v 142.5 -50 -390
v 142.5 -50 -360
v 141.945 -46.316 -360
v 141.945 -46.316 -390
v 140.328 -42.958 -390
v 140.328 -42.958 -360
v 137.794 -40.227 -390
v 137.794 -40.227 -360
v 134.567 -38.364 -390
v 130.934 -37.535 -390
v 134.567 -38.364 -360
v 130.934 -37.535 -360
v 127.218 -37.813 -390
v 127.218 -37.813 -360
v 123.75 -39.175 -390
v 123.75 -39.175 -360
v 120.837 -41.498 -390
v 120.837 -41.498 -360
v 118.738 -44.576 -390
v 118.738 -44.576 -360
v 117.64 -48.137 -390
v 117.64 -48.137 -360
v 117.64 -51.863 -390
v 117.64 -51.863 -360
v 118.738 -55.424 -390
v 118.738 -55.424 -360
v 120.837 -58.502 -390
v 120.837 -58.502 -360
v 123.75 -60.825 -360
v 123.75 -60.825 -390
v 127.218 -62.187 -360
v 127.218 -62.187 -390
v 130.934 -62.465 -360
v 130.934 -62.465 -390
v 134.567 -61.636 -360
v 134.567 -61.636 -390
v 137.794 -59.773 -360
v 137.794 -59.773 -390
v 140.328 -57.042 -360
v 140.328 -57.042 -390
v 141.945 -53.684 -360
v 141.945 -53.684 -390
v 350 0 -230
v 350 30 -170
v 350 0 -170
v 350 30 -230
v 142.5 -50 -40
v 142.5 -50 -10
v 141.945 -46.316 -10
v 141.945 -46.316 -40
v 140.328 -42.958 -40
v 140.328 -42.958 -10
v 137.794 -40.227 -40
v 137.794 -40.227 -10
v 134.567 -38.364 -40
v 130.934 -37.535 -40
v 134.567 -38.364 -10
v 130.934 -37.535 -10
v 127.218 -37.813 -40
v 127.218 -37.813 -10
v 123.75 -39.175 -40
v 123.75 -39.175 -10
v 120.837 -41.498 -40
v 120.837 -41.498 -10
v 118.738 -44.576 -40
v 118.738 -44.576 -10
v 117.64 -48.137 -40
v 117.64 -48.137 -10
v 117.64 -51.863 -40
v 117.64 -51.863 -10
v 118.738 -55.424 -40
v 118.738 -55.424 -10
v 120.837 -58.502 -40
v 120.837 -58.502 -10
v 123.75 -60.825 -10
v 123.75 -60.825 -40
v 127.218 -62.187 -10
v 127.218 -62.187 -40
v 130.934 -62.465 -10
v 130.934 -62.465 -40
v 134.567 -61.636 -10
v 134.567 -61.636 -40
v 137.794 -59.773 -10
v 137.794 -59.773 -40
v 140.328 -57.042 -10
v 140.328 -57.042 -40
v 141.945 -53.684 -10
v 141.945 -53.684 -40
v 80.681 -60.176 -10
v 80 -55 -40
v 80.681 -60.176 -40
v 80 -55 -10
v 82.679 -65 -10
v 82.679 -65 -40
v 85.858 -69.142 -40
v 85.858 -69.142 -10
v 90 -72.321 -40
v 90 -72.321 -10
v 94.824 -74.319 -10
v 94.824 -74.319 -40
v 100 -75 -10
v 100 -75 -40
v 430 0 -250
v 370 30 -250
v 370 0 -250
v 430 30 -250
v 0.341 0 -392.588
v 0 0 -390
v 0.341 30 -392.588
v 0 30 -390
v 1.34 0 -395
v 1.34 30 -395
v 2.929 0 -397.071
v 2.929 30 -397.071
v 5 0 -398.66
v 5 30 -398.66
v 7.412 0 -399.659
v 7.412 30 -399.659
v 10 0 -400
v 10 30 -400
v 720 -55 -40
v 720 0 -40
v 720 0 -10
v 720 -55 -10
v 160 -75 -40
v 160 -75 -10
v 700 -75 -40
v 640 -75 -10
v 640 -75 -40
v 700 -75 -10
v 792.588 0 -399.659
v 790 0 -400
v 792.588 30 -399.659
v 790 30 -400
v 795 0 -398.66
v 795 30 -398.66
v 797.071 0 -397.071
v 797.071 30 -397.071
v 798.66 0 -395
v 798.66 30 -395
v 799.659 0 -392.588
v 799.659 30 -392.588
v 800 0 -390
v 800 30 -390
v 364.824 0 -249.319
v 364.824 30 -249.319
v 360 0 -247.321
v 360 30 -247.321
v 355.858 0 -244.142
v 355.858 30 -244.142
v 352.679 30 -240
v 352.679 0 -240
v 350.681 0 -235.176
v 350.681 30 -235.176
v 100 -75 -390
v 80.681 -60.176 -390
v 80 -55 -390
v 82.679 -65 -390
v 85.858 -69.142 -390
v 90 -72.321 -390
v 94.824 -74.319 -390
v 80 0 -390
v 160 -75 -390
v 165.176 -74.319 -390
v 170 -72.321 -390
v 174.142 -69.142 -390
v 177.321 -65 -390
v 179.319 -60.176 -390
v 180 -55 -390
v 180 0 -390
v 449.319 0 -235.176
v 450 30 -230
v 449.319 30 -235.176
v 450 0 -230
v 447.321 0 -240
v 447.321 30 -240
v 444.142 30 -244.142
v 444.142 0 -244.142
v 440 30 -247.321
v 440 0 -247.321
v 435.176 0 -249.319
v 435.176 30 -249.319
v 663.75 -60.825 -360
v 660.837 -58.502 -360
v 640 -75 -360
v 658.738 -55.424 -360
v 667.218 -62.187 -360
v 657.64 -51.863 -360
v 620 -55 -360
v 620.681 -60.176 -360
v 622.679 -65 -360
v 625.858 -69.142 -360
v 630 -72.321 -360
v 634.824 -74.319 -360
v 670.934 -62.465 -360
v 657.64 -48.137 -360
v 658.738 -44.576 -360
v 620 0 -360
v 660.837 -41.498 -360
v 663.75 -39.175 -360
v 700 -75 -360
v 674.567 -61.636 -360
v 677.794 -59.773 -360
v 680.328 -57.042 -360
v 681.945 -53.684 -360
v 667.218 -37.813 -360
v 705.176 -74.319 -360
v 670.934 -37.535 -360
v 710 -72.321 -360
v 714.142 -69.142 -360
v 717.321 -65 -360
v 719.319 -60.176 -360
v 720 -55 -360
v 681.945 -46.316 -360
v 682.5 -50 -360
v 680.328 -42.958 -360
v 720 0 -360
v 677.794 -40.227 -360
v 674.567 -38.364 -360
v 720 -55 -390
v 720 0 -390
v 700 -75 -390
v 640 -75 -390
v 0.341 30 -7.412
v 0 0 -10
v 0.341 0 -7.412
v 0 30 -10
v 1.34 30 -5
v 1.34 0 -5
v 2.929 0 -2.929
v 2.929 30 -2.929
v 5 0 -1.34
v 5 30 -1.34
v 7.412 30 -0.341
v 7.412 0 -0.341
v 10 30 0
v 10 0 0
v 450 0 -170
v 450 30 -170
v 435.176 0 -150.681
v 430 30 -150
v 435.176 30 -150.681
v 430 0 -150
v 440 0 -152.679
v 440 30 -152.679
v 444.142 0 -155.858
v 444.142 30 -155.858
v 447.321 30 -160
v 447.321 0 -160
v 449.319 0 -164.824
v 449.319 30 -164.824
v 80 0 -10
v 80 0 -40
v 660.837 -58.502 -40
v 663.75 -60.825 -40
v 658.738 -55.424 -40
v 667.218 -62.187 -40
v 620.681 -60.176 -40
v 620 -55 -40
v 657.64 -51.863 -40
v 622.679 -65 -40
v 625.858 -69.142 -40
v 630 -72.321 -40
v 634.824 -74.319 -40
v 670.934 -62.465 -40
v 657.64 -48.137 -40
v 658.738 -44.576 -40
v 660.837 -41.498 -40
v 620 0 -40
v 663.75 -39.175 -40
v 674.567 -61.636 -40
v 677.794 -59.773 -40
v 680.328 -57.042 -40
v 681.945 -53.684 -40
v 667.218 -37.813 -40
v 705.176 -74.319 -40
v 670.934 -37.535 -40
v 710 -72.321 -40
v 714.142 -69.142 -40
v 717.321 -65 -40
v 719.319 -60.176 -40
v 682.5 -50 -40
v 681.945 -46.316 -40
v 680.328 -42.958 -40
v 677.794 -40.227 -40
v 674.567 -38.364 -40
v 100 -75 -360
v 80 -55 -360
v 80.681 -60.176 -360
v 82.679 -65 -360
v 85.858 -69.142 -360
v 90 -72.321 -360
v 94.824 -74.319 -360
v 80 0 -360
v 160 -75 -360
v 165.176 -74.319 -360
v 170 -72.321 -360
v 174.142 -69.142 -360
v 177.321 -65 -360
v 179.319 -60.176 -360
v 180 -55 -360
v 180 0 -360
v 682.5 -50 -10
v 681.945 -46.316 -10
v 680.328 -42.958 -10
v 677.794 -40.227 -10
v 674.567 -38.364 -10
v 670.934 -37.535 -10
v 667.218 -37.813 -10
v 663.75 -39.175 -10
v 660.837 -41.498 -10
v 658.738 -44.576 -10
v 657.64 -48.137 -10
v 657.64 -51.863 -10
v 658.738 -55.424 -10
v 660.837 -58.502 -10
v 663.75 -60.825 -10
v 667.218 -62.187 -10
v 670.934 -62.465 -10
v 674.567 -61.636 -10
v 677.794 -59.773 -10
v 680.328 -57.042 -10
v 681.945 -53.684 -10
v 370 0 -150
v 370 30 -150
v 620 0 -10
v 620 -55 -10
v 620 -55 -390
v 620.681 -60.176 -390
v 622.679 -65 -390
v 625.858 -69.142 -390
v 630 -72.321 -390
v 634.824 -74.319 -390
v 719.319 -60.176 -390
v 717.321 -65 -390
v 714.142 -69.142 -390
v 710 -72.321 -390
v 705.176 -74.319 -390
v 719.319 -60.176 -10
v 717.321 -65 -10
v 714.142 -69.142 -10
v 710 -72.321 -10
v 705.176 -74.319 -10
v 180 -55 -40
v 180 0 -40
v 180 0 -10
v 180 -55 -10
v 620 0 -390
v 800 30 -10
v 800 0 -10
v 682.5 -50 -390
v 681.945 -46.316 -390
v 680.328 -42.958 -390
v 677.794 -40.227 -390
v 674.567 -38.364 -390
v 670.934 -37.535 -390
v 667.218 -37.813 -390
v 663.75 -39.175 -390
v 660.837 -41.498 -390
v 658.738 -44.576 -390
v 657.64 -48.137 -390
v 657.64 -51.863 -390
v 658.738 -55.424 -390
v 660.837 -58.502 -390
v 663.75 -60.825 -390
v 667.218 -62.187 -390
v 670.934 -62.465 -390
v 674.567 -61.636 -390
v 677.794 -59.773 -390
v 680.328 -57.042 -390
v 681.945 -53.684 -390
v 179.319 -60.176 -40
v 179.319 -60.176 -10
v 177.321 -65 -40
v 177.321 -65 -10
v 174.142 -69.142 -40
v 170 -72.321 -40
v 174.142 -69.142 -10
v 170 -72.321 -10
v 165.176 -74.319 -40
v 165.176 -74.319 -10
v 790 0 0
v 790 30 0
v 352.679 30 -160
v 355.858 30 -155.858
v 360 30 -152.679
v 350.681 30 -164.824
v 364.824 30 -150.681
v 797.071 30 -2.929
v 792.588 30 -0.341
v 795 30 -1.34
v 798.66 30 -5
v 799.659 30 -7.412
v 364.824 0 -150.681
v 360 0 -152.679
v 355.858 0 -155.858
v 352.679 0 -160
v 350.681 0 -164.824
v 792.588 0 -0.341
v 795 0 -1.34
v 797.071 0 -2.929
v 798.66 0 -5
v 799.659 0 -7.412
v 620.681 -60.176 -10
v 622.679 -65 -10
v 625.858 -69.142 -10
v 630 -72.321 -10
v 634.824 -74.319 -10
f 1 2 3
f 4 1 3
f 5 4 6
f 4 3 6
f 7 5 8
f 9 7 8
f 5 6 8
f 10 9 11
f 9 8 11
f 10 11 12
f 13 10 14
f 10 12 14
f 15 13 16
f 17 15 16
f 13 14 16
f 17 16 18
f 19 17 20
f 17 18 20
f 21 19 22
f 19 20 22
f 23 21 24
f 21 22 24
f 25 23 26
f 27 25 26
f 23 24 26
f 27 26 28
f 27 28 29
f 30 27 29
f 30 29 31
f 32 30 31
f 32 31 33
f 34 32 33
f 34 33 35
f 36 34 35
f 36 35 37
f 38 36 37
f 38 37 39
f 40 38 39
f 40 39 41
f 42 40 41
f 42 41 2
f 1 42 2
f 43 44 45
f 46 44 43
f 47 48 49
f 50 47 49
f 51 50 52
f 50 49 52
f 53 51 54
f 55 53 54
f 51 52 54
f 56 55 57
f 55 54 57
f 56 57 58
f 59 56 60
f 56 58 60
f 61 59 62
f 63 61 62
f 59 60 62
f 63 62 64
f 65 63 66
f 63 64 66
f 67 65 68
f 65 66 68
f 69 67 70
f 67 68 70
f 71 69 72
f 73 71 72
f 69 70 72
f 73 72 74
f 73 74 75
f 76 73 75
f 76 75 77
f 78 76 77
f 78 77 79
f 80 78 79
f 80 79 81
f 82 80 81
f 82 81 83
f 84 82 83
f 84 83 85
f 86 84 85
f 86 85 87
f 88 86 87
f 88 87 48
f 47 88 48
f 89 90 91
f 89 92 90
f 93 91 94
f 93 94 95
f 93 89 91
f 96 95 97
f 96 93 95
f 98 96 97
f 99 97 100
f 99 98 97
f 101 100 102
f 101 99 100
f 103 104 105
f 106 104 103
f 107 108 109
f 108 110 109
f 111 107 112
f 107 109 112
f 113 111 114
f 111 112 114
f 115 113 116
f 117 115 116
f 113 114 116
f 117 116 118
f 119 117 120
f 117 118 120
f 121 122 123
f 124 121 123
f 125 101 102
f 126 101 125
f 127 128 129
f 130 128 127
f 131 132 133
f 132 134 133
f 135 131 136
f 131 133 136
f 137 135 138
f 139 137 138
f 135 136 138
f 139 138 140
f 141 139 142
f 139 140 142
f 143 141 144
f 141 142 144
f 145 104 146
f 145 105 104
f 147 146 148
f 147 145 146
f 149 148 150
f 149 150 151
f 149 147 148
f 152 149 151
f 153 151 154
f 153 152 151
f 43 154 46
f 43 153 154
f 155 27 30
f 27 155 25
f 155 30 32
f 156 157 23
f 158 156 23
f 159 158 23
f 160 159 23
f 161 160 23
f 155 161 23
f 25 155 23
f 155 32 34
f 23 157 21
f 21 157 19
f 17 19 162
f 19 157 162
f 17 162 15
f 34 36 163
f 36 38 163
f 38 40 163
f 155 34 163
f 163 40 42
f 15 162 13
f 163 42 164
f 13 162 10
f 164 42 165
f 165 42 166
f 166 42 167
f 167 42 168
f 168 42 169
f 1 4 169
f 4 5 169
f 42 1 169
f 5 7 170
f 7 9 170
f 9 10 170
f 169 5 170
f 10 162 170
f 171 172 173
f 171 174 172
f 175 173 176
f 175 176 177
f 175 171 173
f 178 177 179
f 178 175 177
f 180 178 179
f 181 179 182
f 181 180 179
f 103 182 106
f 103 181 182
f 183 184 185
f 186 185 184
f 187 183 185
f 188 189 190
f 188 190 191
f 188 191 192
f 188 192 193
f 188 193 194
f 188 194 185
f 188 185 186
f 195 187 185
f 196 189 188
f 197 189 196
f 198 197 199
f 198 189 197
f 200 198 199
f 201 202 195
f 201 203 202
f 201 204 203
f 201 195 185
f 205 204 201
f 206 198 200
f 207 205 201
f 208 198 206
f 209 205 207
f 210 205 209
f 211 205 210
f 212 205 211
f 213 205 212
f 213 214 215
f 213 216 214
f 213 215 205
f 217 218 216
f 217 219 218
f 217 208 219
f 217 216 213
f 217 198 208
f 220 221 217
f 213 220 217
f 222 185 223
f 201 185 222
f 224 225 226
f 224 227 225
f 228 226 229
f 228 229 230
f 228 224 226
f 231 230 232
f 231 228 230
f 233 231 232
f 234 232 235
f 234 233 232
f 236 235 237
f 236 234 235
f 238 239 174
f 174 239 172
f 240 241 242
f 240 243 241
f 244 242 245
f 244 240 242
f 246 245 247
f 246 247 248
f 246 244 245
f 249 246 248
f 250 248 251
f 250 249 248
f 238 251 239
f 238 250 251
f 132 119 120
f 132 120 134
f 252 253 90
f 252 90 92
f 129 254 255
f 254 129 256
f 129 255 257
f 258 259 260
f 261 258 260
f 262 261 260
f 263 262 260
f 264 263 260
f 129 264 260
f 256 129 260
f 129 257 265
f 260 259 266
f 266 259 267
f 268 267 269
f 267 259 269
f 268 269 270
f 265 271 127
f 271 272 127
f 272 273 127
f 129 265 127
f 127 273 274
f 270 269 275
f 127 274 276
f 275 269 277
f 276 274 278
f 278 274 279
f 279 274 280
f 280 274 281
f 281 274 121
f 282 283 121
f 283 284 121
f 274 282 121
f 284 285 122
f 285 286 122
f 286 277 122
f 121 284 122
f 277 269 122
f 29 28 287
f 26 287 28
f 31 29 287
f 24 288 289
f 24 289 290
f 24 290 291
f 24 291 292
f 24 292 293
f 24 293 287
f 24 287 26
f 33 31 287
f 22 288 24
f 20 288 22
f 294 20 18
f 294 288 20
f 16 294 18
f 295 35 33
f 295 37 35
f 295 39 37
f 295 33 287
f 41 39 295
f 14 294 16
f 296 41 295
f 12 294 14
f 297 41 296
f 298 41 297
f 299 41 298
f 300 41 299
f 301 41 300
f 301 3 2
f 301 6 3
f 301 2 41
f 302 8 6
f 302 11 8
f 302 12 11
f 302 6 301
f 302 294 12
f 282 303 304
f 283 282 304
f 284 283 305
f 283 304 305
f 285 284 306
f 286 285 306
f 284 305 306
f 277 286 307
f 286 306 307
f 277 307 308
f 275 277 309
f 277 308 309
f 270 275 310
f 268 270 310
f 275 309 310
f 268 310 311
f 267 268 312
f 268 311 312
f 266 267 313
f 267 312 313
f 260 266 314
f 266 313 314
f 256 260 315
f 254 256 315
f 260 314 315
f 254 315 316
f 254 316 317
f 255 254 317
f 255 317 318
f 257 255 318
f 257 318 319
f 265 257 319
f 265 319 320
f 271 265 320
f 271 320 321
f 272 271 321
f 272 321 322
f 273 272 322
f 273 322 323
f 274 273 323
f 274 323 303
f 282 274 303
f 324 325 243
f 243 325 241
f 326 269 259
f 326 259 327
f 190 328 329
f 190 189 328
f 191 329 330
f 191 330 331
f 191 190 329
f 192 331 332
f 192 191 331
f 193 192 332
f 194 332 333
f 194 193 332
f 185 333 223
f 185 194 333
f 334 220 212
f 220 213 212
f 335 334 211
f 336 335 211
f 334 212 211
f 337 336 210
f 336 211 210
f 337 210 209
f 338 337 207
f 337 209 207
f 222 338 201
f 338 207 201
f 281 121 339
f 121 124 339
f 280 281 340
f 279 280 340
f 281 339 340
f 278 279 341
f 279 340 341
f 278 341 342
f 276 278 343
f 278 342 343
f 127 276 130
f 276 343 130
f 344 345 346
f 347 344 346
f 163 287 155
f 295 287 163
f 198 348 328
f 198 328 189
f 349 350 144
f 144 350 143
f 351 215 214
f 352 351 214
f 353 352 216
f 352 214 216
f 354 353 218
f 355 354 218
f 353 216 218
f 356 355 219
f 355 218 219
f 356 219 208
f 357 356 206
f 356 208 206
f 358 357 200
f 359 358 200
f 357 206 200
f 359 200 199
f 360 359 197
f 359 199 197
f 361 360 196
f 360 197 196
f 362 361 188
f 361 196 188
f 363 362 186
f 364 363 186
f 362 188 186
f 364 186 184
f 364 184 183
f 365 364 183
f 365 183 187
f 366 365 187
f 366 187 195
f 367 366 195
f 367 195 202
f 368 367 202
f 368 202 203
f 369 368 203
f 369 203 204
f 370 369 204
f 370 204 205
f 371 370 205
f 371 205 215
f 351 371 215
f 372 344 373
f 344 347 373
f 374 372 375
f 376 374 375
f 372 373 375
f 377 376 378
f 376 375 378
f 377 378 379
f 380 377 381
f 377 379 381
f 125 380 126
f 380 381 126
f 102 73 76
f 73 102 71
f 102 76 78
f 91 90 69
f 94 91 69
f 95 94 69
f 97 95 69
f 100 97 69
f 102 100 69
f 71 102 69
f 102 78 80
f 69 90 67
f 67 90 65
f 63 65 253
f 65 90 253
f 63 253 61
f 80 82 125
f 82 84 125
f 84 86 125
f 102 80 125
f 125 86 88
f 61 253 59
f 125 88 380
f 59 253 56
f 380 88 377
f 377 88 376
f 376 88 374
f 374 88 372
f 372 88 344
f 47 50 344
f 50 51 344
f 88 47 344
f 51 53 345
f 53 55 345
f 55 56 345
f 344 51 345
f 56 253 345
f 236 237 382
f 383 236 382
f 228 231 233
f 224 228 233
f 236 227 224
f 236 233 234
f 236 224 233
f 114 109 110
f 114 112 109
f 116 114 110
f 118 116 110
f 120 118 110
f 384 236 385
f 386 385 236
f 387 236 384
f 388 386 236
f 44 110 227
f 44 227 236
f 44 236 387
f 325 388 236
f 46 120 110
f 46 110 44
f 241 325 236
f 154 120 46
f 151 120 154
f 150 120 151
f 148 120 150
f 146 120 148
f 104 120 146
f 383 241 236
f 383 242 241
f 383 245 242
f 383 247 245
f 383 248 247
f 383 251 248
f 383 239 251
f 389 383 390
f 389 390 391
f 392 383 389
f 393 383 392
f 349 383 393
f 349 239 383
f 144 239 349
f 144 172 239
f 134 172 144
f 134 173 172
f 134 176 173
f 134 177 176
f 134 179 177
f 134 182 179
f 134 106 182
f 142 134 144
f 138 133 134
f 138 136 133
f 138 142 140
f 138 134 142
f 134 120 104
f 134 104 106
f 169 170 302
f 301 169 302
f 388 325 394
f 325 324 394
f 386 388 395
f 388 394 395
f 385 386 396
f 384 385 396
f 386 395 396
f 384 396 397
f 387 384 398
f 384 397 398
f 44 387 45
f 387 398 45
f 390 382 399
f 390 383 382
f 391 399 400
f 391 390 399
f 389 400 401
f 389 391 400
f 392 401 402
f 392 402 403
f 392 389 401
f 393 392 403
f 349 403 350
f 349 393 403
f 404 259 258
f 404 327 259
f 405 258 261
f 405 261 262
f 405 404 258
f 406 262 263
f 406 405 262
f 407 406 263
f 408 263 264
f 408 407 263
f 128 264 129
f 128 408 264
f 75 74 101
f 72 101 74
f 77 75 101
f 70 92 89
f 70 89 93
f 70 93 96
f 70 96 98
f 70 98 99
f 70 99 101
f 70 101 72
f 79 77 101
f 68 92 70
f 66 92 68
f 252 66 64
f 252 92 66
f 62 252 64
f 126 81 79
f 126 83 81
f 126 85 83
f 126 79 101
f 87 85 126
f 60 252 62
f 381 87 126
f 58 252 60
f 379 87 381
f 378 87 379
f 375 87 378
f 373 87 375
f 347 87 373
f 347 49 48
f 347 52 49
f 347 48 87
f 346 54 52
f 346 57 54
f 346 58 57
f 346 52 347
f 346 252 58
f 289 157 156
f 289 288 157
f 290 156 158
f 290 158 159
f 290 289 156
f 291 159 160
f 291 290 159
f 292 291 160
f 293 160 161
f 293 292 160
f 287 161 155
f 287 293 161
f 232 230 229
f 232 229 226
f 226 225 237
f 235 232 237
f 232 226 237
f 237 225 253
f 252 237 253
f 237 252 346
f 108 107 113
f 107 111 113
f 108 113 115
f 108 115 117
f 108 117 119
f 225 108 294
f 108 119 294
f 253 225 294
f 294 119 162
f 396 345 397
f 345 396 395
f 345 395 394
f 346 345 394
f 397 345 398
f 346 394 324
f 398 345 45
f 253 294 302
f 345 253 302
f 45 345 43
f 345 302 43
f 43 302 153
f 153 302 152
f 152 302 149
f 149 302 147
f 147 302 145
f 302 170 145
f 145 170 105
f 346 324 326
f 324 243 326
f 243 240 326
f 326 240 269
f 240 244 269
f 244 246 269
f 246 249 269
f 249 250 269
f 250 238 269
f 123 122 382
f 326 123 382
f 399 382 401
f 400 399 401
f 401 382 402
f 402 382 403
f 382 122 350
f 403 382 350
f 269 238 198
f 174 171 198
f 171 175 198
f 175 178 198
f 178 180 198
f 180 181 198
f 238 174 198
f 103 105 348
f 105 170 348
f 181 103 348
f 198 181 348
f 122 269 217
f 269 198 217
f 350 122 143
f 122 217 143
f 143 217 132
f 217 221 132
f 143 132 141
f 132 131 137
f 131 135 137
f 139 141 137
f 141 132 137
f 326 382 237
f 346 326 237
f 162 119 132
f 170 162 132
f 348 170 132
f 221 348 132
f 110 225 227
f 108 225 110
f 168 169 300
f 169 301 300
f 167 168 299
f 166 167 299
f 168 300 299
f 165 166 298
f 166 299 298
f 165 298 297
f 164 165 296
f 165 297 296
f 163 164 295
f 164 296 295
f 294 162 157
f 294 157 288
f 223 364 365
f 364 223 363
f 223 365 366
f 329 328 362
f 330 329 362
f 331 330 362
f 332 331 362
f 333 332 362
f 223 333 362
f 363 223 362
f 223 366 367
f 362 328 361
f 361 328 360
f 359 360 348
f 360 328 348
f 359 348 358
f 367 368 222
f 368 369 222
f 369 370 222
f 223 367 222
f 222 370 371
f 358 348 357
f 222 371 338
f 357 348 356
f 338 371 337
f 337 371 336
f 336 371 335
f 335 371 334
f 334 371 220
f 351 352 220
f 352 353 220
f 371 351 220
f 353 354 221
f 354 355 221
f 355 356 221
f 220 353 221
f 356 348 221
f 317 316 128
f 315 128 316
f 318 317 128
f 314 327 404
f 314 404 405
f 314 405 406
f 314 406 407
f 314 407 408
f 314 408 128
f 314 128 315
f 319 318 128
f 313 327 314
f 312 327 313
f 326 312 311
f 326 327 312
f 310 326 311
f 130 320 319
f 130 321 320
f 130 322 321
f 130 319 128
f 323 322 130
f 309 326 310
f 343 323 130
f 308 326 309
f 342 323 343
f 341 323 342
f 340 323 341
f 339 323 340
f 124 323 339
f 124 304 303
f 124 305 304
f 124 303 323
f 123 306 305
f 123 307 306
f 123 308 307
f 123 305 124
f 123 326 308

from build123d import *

# Parameters (mm, degrees)
SKETCH1_W           = 800
SKETCH1_H           = 400
BOSS_EXTRUDE1_DEPTH = 30
SKETCH3_W           = 100
SKETCH3_H           = 100
CUT_EXTRUDE1_DEPTH  = 895.930164873
FILLET1_R           = 20
SKETCH4_W           = 100
SKETCH4_H           = 30
BOSS_EXTRUDE2_DEPTH = 75
SKETCH5_R           = 12.5
CUT_EXTRUDE2_DEPTH  = 894.154521905
SKETCH6_R           = 12.5
CUT_EXTRUDE3_DEPTH  = 894.154521905
FILLET2_R           = 20
FILLET3_R           = 10


with BuildPart() as part:
    # Sketch1 → Boss-Extrude1 (new body)
    with BuildSketch(Plane(origin=(0, 0, 0), x_dir=(1, 0, 0), z_dir=(0, 1, 0))):
        with Locations((400, 200)):
            Rectangle(SKETCH1_W, SKETCH1_H)
    extrude(amount=BOSS_EXTRUDE1_DEPTH)

    # Sketch3 → Cut-Extrude1 (cut, through all)
    with BuildSketch(Plane(origin=(0, 30, 0), x_dir=(1, 0, 0), z_dir=(0, 1, 0))):
        with Locations((400, 200)):
            Rectangle(SKETCH3_W, SKETCH3_H)
    extrude(amount=-CUT_EXTRUDE1_DEPTH, mode=Mode.SUBTRACT)

    # Fillet1
    fillet1_edges = [part.edges().sort_by_distance(p)[0] for p in [
        (350, 15, -250),
        (450, 15, -250),
        (450, 15, -150),
        (350, 15, -150),
    ]]
    fillet(fillet1_edges, radius=FILLET1_R)

    # Sketch4 → Boss-Extrude2 (add)
    with BuildSketch(Plane.XZ):
        with Locations((130, -25)):
            Rectangle(SKETCH4_W, SKETCH4_H)
        with Locations((670, -25)):
            Rectangle(SKETCH4_W, SKETCH4_H)
        with Locations((670, -375)):
            Rectangle(SKETCH4_W, SKETCH4_H)
        with Locations((130, -375)):
            Rectangle(SKETCH4_W, SKETCH4_H)
    extrude(amount=BOSS_EXTRUDE2_DEPTH)

    # Sketch5 → Cut-Extrude2 (cut, through all)
    with BuildSketch(Plane.XY.offset(-10)):
        with Locations((130, -50)):
            Circle(SKETCH5_R)
    extrude(amount=-CUT_EXTRUDE2_DEPTH, mode=Mode.SUBTRACT)

    # Sketch6 → Cut-Extrude3 (cut, through all)
    with BuildSketch(Plane.XY.offset(-10)):
        with Locations((670, -50)):
            Circle(SKETCH6_R)
    extrude(amount=-CUT_EXTRUDE3_DEPTH, mode=Mode.SUBTRACT)

    # Fillet2
    fillet2_edges = [part.edges().sort_by_distance(p)[0] for p in [
        (180, -75, -375),
        (80, -75, -375),
        (720, -75, -375),
        (620, -75, -375),
        (620, -75, -25),
        (720, -75, -25),
        (80, -75, -25),
        (180, -75, -25),
    ]]
    fillet(fillet2_edges, radius=FILLET2_R)

    # Fillet3
    fillet3_edges = [part.edges().sort_by_distance(p)[0] for p in [
        (0, 15, -400),
        (800, 15, -400),
        (800, 15, 0),
        (0, 15, 0),
    ]]
    fillet(fillet3_edges, radius=FILLET3_R)


solid = part.part
